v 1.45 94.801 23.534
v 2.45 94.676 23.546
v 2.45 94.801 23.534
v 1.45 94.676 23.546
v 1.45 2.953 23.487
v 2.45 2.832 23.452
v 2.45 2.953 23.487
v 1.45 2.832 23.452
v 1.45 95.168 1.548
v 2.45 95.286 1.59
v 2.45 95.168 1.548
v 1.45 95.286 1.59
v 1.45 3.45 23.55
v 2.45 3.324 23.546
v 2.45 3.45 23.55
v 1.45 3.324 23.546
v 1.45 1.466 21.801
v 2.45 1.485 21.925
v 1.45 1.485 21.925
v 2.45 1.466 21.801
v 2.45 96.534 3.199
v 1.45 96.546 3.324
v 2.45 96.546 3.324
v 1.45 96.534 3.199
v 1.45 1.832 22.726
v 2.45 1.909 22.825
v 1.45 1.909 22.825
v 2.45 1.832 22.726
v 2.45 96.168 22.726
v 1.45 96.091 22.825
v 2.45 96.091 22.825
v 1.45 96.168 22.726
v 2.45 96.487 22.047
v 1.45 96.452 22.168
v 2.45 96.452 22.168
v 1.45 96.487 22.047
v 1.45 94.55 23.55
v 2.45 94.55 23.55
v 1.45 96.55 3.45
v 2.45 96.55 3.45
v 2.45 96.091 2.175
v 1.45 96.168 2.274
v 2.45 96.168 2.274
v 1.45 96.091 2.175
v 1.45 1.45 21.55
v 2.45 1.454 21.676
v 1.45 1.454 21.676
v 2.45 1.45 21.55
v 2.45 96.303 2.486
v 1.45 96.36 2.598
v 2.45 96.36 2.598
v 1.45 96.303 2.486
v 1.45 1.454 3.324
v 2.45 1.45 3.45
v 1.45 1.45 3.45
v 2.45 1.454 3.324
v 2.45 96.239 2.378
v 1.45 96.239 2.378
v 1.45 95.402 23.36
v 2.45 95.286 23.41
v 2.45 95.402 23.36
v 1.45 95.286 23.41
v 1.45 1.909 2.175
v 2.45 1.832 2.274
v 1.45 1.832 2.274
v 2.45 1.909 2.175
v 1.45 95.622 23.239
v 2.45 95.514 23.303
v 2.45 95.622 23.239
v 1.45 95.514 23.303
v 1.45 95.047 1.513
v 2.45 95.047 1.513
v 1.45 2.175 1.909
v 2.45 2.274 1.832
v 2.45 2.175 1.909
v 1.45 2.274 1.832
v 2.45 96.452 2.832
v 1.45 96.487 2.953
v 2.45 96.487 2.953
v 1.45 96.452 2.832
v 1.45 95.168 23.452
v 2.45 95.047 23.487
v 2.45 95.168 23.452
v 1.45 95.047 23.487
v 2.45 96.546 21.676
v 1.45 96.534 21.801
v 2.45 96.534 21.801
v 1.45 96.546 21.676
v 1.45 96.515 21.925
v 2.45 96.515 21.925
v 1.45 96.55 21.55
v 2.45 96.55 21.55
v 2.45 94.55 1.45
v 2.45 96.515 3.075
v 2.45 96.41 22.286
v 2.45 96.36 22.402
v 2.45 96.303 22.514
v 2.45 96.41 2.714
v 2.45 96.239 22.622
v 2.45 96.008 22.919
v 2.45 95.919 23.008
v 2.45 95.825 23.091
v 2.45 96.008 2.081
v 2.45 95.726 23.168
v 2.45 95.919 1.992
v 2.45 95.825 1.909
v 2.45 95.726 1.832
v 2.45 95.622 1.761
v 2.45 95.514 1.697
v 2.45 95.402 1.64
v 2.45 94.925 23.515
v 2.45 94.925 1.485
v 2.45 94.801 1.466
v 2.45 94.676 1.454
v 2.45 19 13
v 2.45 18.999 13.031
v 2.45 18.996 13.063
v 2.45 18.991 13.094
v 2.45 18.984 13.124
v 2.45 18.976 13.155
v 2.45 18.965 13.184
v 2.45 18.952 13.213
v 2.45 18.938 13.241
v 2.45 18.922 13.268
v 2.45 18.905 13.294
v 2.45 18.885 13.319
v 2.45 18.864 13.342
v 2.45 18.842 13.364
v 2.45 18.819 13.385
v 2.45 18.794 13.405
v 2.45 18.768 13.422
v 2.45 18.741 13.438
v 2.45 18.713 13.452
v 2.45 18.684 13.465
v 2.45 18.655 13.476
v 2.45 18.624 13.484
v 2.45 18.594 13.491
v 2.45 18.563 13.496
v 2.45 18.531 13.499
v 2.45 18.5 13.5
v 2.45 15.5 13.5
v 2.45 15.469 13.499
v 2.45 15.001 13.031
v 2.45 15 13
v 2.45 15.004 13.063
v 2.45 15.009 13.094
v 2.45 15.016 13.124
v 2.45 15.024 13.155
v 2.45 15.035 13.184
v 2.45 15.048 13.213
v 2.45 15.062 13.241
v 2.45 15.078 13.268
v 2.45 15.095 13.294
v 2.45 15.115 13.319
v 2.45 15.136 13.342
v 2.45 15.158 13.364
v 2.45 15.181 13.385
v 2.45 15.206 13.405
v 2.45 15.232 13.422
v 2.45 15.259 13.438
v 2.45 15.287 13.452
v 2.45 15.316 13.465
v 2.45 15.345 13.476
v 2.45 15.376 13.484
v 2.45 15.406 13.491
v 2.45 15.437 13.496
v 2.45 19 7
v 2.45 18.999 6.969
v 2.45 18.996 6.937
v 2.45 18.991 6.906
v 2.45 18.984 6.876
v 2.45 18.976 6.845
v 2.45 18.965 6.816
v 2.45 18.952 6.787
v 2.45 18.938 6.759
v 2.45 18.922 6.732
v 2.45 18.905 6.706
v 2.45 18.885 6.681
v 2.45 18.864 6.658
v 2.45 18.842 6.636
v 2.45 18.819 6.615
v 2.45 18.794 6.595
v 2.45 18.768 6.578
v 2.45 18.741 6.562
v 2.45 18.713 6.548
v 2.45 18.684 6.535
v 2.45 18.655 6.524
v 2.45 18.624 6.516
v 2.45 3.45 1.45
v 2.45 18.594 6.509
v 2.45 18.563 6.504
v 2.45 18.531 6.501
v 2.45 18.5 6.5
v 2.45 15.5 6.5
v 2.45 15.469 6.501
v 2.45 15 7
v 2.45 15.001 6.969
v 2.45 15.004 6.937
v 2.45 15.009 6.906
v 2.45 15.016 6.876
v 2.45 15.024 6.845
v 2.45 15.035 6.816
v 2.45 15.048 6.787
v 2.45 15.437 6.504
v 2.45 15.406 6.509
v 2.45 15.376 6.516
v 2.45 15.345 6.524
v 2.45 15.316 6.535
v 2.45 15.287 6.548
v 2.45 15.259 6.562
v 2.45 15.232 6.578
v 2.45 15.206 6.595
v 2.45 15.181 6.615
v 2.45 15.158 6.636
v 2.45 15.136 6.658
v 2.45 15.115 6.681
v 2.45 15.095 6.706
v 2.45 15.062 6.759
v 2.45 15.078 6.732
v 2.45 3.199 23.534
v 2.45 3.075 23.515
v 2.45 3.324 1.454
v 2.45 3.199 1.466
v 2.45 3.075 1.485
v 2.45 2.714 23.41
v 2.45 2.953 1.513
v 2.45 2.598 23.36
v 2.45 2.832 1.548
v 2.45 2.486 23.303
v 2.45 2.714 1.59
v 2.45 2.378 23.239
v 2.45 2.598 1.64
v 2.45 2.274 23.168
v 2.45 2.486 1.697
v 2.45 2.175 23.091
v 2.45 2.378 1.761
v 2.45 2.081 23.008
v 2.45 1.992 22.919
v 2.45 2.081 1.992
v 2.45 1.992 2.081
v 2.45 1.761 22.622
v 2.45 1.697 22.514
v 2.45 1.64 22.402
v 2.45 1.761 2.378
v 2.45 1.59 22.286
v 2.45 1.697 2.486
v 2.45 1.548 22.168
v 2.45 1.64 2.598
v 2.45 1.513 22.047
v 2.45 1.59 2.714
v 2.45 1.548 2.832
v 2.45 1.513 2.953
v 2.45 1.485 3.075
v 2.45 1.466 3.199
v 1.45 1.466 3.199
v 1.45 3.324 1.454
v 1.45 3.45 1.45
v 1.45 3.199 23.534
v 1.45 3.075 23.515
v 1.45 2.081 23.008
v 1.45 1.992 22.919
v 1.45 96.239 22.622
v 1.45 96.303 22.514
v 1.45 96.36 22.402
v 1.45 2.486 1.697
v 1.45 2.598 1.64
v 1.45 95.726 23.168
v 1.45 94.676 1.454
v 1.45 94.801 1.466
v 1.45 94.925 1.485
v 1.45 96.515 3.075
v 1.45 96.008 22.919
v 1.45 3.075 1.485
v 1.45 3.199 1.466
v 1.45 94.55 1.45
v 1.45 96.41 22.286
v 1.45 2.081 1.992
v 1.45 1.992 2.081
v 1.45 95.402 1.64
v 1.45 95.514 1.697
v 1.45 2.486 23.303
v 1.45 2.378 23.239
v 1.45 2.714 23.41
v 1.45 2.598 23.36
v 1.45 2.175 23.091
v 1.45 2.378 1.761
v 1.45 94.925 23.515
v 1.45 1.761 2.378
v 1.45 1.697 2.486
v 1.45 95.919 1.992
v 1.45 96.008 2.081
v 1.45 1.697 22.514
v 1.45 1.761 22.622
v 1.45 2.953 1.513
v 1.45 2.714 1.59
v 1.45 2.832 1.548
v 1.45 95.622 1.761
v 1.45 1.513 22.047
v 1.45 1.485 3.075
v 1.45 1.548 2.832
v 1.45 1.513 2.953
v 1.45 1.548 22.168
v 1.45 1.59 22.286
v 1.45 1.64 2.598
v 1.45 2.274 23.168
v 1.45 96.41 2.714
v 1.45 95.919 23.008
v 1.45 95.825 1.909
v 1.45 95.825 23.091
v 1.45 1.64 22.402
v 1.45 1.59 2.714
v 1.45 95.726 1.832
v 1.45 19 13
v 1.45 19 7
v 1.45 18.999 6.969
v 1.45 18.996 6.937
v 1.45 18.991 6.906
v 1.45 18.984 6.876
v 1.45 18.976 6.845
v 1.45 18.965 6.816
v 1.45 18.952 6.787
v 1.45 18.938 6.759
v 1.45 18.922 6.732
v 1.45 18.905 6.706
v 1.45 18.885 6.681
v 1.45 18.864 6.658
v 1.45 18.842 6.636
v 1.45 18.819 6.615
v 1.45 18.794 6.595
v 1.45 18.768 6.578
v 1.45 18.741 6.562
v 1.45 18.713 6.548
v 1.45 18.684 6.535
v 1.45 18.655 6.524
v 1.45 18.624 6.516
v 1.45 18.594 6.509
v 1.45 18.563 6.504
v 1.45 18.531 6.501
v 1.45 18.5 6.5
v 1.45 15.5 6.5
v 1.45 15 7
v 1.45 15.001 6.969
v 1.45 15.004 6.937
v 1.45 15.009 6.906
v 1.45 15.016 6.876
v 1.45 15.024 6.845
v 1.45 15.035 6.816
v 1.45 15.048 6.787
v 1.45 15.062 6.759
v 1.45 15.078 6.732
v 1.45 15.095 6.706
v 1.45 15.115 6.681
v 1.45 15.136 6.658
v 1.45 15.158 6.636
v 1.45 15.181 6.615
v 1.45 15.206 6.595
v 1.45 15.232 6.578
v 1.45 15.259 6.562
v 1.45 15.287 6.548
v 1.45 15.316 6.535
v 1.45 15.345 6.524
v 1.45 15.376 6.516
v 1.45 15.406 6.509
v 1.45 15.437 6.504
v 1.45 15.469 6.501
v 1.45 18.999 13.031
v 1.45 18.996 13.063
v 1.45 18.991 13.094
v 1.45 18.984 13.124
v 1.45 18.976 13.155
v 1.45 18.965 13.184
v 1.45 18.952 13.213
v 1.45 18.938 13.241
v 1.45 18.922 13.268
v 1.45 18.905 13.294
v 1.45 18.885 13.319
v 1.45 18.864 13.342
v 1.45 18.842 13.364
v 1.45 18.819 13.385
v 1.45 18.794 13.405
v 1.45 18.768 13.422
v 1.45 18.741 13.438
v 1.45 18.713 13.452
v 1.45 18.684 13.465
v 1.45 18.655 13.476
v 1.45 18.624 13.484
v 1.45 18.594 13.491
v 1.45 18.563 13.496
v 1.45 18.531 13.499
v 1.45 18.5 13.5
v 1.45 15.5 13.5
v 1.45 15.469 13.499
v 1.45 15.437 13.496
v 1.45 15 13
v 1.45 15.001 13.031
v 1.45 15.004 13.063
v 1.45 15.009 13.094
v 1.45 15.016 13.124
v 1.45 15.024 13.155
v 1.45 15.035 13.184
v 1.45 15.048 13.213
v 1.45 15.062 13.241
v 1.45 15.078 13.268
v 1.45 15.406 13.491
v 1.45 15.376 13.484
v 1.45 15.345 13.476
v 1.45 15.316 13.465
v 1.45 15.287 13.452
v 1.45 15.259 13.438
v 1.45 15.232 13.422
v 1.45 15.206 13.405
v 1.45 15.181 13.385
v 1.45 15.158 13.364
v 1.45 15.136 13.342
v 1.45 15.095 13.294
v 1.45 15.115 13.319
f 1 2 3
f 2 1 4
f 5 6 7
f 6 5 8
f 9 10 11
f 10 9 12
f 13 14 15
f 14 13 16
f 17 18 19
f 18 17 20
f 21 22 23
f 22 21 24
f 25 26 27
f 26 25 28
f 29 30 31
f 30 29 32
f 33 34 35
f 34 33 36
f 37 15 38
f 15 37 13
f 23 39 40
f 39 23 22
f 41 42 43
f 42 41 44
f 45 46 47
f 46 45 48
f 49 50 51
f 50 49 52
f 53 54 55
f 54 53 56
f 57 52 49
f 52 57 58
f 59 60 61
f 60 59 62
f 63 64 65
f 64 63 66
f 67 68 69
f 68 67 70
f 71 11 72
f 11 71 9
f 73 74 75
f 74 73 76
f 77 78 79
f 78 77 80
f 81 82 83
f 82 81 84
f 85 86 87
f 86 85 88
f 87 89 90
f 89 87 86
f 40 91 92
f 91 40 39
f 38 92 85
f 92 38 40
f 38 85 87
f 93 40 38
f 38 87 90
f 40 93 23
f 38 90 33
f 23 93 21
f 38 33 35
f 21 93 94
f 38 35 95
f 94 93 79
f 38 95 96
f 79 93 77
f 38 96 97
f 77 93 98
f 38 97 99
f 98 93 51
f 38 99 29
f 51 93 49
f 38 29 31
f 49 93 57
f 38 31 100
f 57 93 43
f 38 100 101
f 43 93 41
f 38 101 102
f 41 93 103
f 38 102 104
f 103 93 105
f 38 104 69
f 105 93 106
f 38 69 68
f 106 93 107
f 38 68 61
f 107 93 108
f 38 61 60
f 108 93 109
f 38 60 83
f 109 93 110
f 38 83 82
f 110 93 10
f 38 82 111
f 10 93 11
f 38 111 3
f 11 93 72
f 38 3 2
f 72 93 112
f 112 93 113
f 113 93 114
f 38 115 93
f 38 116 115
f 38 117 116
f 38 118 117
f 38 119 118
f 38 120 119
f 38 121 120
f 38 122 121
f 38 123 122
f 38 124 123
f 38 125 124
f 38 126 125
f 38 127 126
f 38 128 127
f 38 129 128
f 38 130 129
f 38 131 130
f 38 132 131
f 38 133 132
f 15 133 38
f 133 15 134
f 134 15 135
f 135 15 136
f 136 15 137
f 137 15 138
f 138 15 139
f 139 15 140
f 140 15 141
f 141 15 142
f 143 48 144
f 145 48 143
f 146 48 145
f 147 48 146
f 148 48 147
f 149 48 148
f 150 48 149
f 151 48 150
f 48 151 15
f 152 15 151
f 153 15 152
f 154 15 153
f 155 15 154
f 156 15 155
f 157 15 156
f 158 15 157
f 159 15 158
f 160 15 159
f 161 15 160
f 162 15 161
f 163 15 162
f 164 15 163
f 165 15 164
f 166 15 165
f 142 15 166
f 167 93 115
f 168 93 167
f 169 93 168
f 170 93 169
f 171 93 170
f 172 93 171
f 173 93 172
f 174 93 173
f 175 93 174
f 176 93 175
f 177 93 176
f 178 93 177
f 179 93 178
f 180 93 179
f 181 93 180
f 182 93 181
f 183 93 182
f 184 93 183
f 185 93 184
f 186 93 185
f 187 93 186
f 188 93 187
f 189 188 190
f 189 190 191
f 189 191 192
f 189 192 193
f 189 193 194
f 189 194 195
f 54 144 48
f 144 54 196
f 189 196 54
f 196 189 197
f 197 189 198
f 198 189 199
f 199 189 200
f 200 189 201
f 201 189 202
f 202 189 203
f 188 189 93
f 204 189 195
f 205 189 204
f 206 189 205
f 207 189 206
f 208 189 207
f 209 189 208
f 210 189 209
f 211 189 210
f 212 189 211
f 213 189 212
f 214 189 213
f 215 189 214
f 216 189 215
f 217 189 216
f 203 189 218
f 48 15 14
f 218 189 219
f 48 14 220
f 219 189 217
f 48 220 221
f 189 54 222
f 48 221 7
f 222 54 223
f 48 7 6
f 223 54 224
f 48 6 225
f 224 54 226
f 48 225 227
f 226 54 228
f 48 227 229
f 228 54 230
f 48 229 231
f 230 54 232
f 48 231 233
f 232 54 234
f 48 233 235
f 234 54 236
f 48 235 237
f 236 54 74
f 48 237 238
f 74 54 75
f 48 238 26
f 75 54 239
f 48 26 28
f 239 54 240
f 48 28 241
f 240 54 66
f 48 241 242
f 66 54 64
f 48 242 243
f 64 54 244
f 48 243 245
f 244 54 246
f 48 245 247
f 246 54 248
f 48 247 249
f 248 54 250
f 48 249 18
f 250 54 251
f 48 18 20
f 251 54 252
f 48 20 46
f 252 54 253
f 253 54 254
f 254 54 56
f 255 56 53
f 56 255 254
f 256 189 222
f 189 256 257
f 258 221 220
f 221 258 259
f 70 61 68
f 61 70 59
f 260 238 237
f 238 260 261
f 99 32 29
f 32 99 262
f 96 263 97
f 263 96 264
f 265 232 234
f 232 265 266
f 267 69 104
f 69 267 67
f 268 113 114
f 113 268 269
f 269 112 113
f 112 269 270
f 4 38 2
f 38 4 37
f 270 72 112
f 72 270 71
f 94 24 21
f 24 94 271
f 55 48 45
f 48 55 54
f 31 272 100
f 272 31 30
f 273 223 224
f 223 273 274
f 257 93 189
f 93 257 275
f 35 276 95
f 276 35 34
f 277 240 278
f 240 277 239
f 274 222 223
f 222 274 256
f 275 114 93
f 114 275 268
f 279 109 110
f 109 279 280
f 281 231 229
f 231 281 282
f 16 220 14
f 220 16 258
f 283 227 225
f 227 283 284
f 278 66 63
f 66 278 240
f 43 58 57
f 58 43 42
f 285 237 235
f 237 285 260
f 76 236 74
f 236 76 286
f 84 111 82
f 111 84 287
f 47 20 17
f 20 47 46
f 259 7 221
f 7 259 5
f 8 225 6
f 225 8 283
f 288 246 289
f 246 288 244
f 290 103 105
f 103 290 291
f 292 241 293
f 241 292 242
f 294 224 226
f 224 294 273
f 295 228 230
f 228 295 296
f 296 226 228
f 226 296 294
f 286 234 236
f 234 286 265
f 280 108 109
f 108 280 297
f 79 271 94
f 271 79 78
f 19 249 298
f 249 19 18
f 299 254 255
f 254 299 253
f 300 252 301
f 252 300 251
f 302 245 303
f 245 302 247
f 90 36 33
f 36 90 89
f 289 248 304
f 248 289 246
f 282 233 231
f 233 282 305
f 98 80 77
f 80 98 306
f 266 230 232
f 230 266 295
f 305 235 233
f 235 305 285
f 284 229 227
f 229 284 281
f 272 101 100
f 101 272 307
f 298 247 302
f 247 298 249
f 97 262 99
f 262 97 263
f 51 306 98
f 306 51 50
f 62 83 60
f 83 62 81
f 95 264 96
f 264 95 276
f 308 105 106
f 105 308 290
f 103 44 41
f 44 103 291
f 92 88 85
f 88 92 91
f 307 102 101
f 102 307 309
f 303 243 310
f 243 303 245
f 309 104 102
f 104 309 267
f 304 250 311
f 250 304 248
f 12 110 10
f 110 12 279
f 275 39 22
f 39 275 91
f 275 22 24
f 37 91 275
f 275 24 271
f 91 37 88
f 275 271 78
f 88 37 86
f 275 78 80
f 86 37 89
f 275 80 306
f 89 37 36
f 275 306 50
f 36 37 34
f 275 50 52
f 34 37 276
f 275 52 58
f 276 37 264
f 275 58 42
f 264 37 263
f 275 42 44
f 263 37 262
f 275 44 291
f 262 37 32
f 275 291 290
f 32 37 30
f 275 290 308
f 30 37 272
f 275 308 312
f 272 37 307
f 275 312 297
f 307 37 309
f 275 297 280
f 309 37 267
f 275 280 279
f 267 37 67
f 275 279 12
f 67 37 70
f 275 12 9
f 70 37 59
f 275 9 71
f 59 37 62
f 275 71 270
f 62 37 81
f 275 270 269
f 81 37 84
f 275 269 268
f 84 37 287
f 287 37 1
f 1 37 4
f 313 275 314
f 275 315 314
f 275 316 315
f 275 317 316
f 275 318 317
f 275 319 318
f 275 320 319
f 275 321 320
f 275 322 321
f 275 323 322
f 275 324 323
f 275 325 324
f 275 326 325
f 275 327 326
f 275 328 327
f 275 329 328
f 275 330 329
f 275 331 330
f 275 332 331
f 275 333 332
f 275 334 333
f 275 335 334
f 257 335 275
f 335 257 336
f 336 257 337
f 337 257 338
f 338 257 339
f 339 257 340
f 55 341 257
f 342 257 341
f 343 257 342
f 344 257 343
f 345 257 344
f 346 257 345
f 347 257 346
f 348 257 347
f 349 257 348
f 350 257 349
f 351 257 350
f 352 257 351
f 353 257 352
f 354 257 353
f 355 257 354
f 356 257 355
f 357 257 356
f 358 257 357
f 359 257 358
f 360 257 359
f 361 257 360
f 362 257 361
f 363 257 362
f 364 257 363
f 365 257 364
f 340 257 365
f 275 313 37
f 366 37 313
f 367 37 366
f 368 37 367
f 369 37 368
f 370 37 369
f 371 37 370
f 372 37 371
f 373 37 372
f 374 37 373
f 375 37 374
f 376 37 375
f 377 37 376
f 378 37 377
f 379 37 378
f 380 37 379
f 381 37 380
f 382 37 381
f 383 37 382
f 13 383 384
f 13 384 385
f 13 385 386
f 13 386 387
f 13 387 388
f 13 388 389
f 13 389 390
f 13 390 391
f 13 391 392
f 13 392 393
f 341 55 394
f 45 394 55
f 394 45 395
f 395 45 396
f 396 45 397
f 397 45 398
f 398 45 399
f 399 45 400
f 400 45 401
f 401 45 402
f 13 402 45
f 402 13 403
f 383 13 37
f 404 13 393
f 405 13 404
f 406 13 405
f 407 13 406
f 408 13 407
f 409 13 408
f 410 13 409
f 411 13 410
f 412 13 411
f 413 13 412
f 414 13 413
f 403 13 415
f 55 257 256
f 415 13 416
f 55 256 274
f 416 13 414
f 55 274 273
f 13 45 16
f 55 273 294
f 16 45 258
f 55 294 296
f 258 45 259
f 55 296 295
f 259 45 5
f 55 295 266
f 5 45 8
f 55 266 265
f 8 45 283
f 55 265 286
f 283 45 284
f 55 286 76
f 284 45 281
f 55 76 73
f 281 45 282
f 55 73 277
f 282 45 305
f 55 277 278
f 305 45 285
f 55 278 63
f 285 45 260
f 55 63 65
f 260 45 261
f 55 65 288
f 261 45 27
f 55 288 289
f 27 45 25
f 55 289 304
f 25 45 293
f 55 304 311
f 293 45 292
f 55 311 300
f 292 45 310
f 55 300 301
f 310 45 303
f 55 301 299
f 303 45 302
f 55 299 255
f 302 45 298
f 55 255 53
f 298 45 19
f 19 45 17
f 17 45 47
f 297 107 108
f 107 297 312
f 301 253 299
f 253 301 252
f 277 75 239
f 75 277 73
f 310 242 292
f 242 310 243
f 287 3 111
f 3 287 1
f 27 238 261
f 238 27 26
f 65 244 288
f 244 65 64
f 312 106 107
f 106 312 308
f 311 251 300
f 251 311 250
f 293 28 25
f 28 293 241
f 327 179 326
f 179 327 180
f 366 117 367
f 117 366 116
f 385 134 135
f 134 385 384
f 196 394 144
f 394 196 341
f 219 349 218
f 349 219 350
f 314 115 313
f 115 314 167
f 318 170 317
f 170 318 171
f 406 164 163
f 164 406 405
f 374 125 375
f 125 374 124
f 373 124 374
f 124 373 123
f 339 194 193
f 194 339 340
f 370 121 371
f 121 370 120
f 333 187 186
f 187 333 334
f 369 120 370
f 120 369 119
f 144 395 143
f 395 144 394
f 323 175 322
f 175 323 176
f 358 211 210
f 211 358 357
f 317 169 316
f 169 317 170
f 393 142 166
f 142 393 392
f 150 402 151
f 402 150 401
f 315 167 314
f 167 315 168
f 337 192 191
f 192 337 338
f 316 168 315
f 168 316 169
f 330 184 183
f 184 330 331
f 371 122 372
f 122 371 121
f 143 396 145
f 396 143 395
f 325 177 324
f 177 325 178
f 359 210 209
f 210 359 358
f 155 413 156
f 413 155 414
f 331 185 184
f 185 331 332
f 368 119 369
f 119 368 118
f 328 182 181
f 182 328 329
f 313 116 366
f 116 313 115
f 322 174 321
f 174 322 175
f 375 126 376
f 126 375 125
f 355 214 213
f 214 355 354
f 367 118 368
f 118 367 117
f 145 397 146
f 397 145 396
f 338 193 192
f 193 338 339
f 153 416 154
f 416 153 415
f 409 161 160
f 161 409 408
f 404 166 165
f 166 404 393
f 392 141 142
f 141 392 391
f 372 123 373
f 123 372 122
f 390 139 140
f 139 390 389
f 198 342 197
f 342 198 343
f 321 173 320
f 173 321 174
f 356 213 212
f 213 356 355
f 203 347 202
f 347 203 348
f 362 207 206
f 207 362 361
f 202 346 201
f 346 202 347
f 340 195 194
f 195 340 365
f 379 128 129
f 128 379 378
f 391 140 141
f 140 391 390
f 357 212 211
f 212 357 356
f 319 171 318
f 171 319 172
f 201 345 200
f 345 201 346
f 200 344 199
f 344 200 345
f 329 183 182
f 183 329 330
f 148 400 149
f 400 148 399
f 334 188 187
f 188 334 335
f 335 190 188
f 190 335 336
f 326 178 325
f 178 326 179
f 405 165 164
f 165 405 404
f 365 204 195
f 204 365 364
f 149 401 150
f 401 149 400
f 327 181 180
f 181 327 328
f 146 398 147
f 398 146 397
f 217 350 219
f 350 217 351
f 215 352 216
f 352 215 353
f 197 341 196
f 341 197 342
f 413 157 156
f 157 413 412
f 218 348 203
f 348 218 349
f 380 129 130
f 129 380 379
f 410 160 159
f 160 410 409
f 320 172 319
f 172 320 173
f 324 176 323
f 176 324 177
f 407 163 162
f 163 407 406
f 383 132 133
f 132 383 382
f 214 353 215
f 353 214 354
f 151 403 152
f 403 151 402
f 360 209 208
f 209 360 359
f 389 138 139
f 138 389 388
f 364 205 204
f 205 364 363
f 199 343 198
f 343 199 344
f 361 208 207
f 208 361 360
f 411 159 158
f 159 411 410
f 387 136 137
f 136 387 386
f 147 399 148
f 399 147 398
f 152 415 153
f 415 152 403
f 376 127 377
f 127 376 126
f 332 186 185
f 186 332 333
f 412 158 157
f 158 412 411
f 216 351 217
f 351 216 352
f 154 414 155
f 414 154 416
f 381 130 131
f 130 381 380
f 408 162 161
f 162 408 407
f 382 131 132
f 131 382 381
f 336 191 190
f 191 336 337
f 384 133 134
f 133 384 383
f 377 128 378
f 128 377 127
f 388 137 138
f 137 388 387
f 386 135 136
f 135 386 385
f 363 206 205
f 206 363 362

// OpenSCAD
/*//////////////////////////////////////////////////////////////////
              -    FB Aka Heartman/Hearty 2016     -                   
              -   http://heartygfx.blogspot.com    -                  
              -       OpenScad Parametric Box      -                     
              -         CC BY-NC 3.0 License       -                      
////////////////////////////////////////////////////////////////////                                                                                                             
12/02/2016 - Fixed minor bug 
28/02/2016 - Added holes ventilation option                    
09/03/2016 - Added PCB feet support, fixed the shell artefact on export mode. 

*/////////////////////////// - Info - //////////////////////////////

// All coordinates are starting as integrated circuit pins.
// From the top view :

//   CoordD           <---       CoordC
//                                 ^
//                                 ^
//                                 ^
//   CoordA           --->       CoordB


////////////////////////////////////////////////////////////////////


////////// - Paramètres de la boite - Box parameters - /////////////

/* [Box dimensions] */
// - Longueur - Length  
  Length        = 60;       
// - Largeur - Width
  Width         = 98;                     
// - Hauteur - Height  
  Height        = 25;  
// - Epaisseur - Wall thickness  
  Thick         = 1;//[2:5]  
  
/* [Box options] */
// - Diamètre Coin arrondi - Filet diameter  
  Filet         = 2;//[0.1:12] 
// - lissage de l'arrondi - Filet smoothness  
  Resolution    = 50;//[1:100] 
// - Tolérance - Tolerance (Panel/rails gap)
  m             = 0.9;
// Pieds PCB - PCB feet (x4) 
  PCBFeet       = 0;// [0:No, 1:Yes]
// - Decorations to ventilation holes
  Vent          = 1;// [0:No, 1:Yes]
// - Decoration-Holes width (in mm)
  Vent_width    = 1.5;   


  
/* [PCB_Feet] */
//All dimensions are from the center foot axis

// - Coin bas gauche - Low left corner X position
PCBPosX         = 7;
// - Coin bas gauche - Low left corner Y position
PCBPosY         = 6;
// - Longueur PCB - PCB Length
PCBLength       = 70;
// - Largeur PCB - PCB Width
PCBWidth        = 50;
// - Heuteur pied - Feet height
FootHeight      = 10;
// - Diamètre pied - Foot diameter
FootDia         = 8;
// - Diamètre trou - Hole diameter
FootHole        = 3;  
  

/* [STL element to export] */
//Coque haut - Top shell
TShell          = 0;// [0:No, 1:Yes]
//Coque bas- Bottom shell
BShell          = 0;// [0:No, 1:Yes]
//Panneau avant - Front panel
FPanL           = 0;// [0:No, 1:Yes]
//Panneau arrière - Back panel  
BPanL           = 1;// [0:No, 1:Yes]


  
/* [Hidden] */
// - Couleur coque - Shell color  
Couleur1        = "Orange";       
// - Couleur panneaux - Panels color    
Couleur2        = "OrangeRed";    
// Thick X 2 - making decorations thicker if it is a vent to make sure they go through shell
Dec_Thick       = Vent ? Thick*2 : Thick; 
// - Depth decoration
Dec_size        = Vent ? Thick*2 : 0.8;





/////////// - Boitier générique bord arrondis - Generic rounded box - //////////

module RoundBox($a=Length, $b=Width, $c=Height){// Cube bords arrondis
                    $fn=Resolution;            
                    translate([0,Filet,Filet]){  
                    minkowski (){                                              
                        cube ([$a-(Length/2),$b-(2*Filet),$c-(2*Filet)], center = false);
                        rotate([0,90,0]){    
                        cylinder(r=Filet,h=Length/2, center = false);
                            } 
                        }
                    }
                }// End of RoundBox Module

      
////////////////////////////////// - Module Coque/Shell - //////////////////////////////////         

module Coque(){//Coque - Shell  
    Thick = Thick*2;  
    difference(){    
        difference(){//sides decoration
            union(){    
                     difference() {//soustraction de la forme centrale - Substraction Fileted box
                      
                        difference(){//soustraction cube median - Median cube slicer
                            union() {//union               
                            difference(){//Coque    
                                RoundBox();
                                translate([Thick/2,Thick/2,Thick/2]){     
                                        RoundBox($a=Length-Thick, $b=Width-Thick, $c=Height-Thick);
                                        }
                                        }//Fin diff Coque                            
                                difference(){//largeur Rails        
                                     translate([Thick+m,Thick/2,Thick/2]){// Rails
                                          RoundBox($a=Length-((2*Thick)+(2*m)), $b=Width-Thick, $c=Height-(Thick*2));
                                                          }//fin Rails
                                     translate([((Thick+m/2)*1.55),Thick/2,Thick/2+0.1]){ // +0.1 added to avoid the artefact
                                          RoundBox($a=Length-((Thick*3)+2*m), $b=Width-Thick, $c=Height-Thick);
                                                    }           
                                                }//Fin largeur Rails
                                    }//Fin union                                   
                               translate([-Thick,-Thick,Height/2]){// Cube à soustraire
                                    cube ([Length+100, Width+100, Height], center=false);
                                            }                                            
                                      }//fin soustraction cube median - End Median cube slicer
                               translate([-Thick/2,Thick,Thick]){// Forme de soustraction centrale 
                                    RoundBox($a=Length+Thick, $b=Width-Thick*2, $c=Height-Thick);       
                                    }                          
                                }                                          


                difference(){// wall fixation box legs
                    union(){
                        translate([3*Thick +5,Thick,Height/2]){
                            rotate([90,0,0]){
                                    $fn=6;
                                    cylinder(d=16,Thick/2);
                                    }   
                            }
                            
                       translate([Length-((3*Thick)+5),Thick,Height/2]){
                            rotate([90,0,0]){
                                    $fn=6;
                                    cylinder(d=16,Thick/2);
                                    }   
                            }

                        }
                            translate([4,Thick+Filet,Height/2-57]){   
                             rotate([45,0,0]){
                                   cube([Length,40,40]);    
                                  }
                           }
                           translate([0,-(Thick*1.46),Height/2]){
                                cube([Length,Thick*2,10]);
                           }
                    } //Fin fixation box legs
            }

        union(){// outbox sides decorations
            
            for(i=[0:Thick:Length/4]){

                // Ventilation holes part code submitted by Ettie - Thanks ;) 
                    translate([10+i,-Dec_Thick+Dec_size,1]){
                    cube([Vent_width,Dec_Thick,Height/4]);
                    }
                    translate([(Length-10) - i,-Dec_Thick+Dec_size,1]){
                    cube([Vent_width,Dec_Thick,Height/4]);
                    }
                    translate([(Length-10) - i,Width-Dec_size,1]){
                    cube([Vent_width,Dec_Thick,Height/4]);
                    }
                    translate([10+i,Width-Dec_size,1]){
                    cube([Vent_width,Dec_Thick,Height/4]);
                    }
  
                
                    }// fin de for
               // }
                }//fin union decoration
            }//fin difference decoration


            union(){ //sides holes
                $fn=50;
                translate([3*Thick+5,20,Height/2+4]){
                    rotate([90,0,0]){
                    cylinder(d=2,20);
                    }
                }
                translate([Length-((3*Thick)+5),20,Height/2+4]){
                    rotate([90,0,0]){
                    cylinder(d=2,20);
                    }
                }
                translate([3*Thick+5,Width+5,Height/2-4]){
                    rotate([90,0,0]){
                    cylinder(d=2,20);
                    }
                }
                translate([Length-((3*Thick)+5),Width+5,Height/2-4]){
                    rotate([90,0,0]){
                    cylinder(d=2,20);
                    }
                }
            }//fin de sides holes

        }//fin de difference holes
}// fin coque 

////////////////////////////// - Experiment - ///////////////////////////////////////////





/////////////////////// - Foot with base filet - /////////////////////////////
module foot(FootDia,FootHole,FootHeight){
    Filet=2;
    color(Couleur1)   
    translate([0,0,Filet-1.5])
    difference(){
    
    difference(){
            //translate ([0,0,-Thick]){
                cylinder(d=FootDia+Filet,FootHeight-Thick, $fn=100);
                        //}
                    rotate_extrude($fn=100){
                            translate([(FootDia+Filet*2)/2,Filet,0]){
                                    minkowski(){
                                            square(10);
                                            circle(Filet, $fn=100);
                                        }
                                 }
                           }
                   }
            cylinder(d=FootHole,FootHeight+1, $fn=100);
               }          
}// Fin module foot
  
module Feet(){     
//////////////////// - PCB only visible in the preview mode - /////////////////////    
    translate([3*Thick+2,Thick+5,FootHeight+(Thick/2)-0.5]){
    
    %square ([PCBLength+10,PCBWidth+10]);
       translate([PCBLength/2,PCBWidth/2,0.5]){ 
        color("Olive")
        %text("PCB", halign="center", valign="center", font="Arial black");
       }
    } // Fin PCB 
  
    
////////////////////////////// - 4 Feet - //////////////////////////////////////////     
    translate([3*Thick+7,Thick+10,Thick/2]){
        foot(FootDia,FootHole,FootHeight);
    }
    translate([(3*Thick)+PCBLength+7,Thick+10,Thick/2]){
        foot(FootDia,FootHole,FootHeight);
        }
    translate([(3*Thick)+PCBLength+7,(Thick)+PCBWidth+10,Thick/2]){
        foot(FootDia,FootHole,FootHeight);
        }        
    translate([3*Thick+7,(Thick)+PCBWidth+10,Thick/2]){
        foot(FootDia,FootHole,FootHeight);
    }   

} // Fin du module Feet
 


 
 ////////////////////////////////////////////////////////////////////////
////////////////////// <- Holes Panel Manager -> ///////////////////////
////////////////////////////////////////////////////////////////////////

//                           <- Panel ->  
module Panel(Length,Width,Thick,Filet){
    scale([0.5,1,1])
    minkowski(){
            cube([Thick,Width-(Thick*2+Filet*2+m),Height-(Thick*2+Filet*2+m)]);
            translate([0,Filet,Filet])
            rotate([0,90,0])
            cylinder(r=Filet,h=Thick, $fn=100);
      }
}



//                          <- Circle hole -> 
// Cx=Cylinder X position | Cy=Cylinder Y position | Cdia= Cylinder dia | Cheight=Cyl height
module CylinderHole(OnOff,Cx,Cy,Cdia){
    if(OnOff==1)
    translate([Cx,Cy,-1])
        cylinder(d=Cdia,10, $fn=50);
}
//                          <- Square hole ->  
// Sx=Square X position | Sy=Square Y position | Sl= Square Length | Sw=Square Width | Filet = Round corner
module SquareHole(OnOff,Sx,Sy,Sl,Sw,Filet){
    if(OnOff==1)
     minkowski(){
        translate([Sx+Filet/2,Sy+Filet/2,-1])
            cube([Sl-Filet,Sw-Filet,10]);
            cylinder(d=Filet,h=10, $fn=100);
       }
}


 
//                      <- Linear text panel -> 
module LText(OnOff,Tx,Ty,Font,Size,Content){
    if(OnOff==1)
    translate([Tx,Ty,Thick+.5])
    linear_extrude(height = 0.5){
    text(Content, size=Size, font=Font);
    }
}
//                     <- Circular text panel->  
module CText(OnOff,Tx,Ty,Font,Size,TxtRadius,Angl,Turn,Content){ 
      if(OnOff==1) {
      Angle = -Angl / len(Content);
      translate([Tx,Ty,Thick+.5])
          for (i= [0:len(Content)-1] ){   
              rotate([0,0,i*Angle+90+Turn])
              translate([0,TxtRadius,0]) {
                linear_extrude(height = 0.5){
                text(Content[i], font = Font, size = Size,  valign ="baseline", halign ="center");
                    }
                }   
             }
      }
}
////////////////////// <- New module Panel -> //////////////////////
module FPanL(){
    difference(){
        color(Couleur2)
        Panel(Length,Width,Thick,Filet);
    
 
    rotate([90,0,90]){
        color(Couleur2){
//                     <- Cutting shapes from here ->  
        SquareHole  (1,10,4,30,14,1); //(On/Off, Xpos,Ypos,Length,Width,Filet)
        SquareHole  (1,55,4,30,14,1); //(On/Off, Xpos,Ypos,Length,Width,Filet)
            
//        CylinderHole(1,27,40,8);       //(On/Off, Xpos, Ypos, Diameter)
//                            <- To here -> 
           }
       }
}

    color(Couleur1){
        translate ([-.5,0,0])
        rotate([90,0,90]){
//                      <- Adding text from here ->          
        LText(1,43
            ,13,"Arial Black",3,"GPS");//(On/Off, Xpos, Ypos, "Font", Size, "Text")
        LText(1,41,6,"Arial Black",3,"Clock");            
//                            <- To here ->
            }
      }
}


/////////////////////////// <- Main part -> /////////////////////////

if(TShell==1) {
// Coque haut - Top Shell
        color( Couleur1,1){
            translate([0,Width,Height+0.2]){
                rotate([0,180,180]){
                        Coque();
                        }
                }
        }

    color(Couleur2){
        translate ([50,0,23.5])
        rotate([0,0,90]){
//                      <- Adding text from here ->          
        LText(1,17,35,"Arial Black",6,"IBE Group, Inc.");            
        LText(1,33
            ,17,"Arial Black",10,"GPS");//(On/Off, Xpos, Ypos, "Font", Size, "Text")
        LText(1,23,0,"Arial Black",10,"CLOCK");            
//                            <- To here ->
            }
      }

}
if(BShell==1)
{
// Coque bas - Bottom shell
        color(Couleur1){ 
        Coque();
        }

    color(Couleur2){
        translate ([50,90,1.8])
        rotate([0,180,90]){
        LText(1,17,33,"Arial Black",6,"IBE Group");            
        LText(1,15,18,"Arial Black",6,"Copyright©");            
        LText(1,28,2,"Arial Black",6,"2018");            
//                            <- To here ->
            }
      }


}
// Pied support PCB - PCB feet
if (PCBFeet==1)
// Feet
        translate([PCBPosX,PCBPosY,0]){ 
        Feet();
        }

// Panneau avant - Front panel  <<<<<< Text and holes only on this one.
//rotate([0,-90,-90]) 
if(FPanL==1)
        translate([Length-(Thick*2+m/2),Thick+m/2,Thick+m/2])
        FPanL();

//Panneau arrière - Back panel
if(BPanL==1) {
    difference() { 
        color(Couleur2)
        translate([Thick+m/2,Thick+m/2,Thick+m/2])
        Panel(Length,Width,Thick,Filet);
    
        rotate([90,0,90]){
            color(Couleur1)
            SquareHole  (1,15,6.5,4,7,1); //(On/Off, Xpos,Ypos,Length,Width,Filet)
        }
    }    
}
